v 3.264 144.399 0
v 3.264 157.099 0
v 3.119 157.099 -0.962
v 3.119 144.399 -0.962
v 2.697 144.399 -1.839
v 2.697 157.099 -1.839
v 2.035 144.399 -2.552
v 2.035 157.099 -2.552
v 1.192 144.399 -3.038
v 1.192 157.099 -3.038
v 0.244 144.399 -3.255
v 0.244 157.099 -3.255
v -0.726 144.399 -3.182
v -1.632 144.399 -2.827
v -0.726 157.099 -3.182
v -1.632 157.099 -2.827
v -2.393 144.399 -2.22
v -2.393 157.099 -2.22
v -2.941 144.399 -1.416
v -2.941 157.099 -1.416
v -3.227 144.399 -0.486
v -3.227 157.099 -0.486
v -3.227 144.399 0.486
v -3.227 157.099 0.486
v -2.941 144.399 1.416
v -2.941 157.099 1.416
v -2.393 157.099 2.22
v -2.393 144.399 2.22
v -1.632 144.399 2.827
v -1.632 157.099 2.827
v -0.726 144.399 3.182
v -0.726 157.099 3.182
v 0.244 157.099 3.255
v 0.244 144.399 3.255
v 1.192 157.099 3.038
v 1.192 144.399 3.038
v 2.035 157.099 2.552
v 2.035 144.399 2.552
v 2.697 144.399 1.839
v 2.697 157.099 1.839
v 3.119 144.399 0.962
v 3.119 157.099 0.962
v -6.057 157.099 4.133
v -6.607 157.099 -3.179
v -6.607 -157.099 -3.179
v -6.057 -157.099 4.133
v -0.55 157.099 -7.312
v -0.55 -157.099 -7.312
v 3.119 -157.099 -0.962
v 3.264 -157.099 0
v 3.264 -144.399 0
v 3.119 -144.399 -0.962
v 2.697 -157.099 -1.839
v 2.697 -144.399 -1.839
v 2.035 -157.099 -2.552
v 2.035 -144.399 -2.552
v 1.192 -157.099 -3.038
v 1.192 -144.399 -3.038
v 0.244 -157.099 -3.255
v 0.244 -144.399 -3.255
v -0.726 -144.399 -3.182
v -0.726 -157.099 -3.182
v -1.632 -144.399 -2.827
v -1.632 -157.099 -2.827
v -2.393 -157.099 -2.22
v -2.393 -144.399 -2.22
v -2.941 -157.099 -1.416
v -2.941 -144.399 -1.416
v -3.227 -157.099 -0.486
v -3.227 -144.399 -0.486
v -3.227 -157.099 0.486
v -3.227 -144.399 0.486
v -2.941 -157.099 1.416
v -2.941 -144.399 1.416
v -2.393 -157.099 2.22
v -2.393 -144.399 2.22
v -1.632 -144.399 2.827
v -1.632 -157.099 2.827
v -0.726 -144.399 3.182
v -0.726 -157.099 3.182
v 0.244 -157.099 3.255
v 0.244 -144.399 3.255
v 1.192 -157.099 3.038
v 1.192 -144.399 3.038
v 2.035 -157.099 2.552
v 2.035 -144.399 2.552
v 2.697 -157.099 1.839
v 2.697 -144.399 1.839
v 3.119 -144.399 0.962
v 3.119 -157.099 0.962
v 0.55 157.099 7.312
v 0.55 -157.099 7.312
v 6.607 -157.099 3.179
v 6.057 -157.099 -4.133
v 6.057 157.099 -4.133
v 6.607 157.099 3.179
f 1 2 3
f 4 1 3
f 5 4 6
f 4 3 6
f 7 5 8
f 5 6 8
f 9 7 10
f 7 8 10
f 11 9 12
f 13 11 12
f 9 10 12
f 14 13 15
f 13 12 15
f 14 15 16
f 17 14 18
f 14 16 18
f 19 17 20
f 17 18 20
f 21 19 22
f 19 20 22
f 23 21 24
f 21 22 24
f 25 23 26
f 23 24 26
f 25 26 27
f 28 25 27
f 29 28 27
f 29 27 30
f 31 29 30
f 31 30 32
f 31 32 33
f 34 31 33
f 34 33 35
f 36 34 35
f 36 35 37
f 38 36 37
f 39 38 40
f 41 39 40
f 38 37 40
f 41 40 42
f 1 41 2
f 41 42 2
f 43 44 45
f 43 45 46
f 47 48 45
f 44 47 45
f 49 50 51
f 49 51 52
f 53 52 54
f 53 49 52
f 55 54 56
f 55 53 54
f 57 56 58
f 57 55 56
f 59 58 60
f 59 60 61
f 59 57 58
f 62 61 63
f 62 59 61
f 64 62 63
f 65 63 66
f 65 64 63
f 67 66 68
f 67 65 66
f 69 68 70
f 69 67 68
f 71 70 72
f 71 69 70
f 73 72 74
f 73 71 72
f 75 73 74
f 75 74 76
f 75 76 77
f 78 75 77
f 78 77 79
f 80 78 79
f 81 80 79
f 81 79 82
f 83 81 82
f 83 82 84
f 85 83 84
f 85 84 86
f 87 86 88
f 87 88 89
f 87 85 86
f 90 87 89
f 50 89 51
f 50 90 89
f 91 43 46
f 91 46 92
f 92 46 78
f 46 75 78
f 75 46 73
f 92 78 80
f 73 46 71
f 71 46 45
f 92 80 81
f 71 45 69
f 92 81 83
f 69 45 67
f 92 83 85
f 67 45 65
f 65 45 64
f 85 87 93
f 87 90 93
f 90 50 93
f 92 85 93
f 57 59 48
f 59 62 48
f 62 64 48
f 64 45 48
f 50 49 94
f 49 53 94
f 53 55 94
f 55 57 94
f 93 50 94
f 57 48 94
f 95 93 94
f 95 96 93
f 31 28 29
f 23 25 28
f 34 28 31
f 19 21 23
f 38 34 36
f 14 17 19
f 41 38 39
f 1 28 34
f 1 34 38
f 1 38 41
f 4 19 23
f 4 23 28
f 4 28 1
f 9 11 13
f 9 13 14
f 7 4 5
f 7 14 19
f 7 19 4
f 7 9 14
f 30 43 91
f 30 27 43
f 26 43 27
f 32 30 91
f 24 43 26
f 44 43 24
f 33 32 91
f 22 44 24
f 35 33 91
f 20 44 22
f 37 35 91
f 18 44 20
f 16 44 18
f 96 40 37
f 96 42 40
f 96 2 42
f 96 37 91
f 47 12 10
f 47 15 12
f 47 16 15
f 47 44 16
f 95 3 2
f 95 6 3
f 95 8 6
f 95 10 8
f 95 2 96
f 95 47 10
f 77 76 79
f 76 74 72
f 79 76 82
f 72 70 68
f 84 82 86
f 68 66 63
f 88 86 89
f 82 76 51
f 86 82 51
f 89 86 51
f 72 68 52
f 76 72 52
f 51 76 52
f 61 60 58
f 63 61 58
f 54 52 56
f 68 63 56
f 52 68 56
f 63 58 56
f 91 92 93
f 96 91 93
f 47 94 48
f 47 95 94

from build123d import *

# Parameters (mm, degrees)
BOSS_EXTRUDE1_DEPTH = 157.099
SKETCH2_R           = 3.2639
CUT_EXTRUDE1_DEPTH  = 12.7


with BuildPart() as part:
    # Sketch1 → Boss-Extrude1 (new body, symmetric)
    with BuildSketch(Plane(origin=(0, 0, 0), x_dir=(1, 0, 0), z_dir=(0, 1, 0))):
        Polygon((6.05685162, 4.132539387), (-0.550458281, 7.311657064), (-6.607309901, 3.179117677), (-6.05685162, -4.132539387), (0.550458281, -7.311657064), (6.607309901, -3.179117677), align=None)
    extrude(amount=BOSS_EXTRUDE1_DEPTH, both=True)

    # Sketch2 → Cut-Extrude1 (cut)
    with BuildSketch(Plane(origin=(0, 157.099, 0), x_dir=(1, 0, 0), z_dir=(0, 1, 0))):
        Circle(SKETCH2_R)
    cut_extrude1 = extrude(amount=-CUT_EXTRUDE1_DEPTH, mode=Mode.SUBTRACT)

    # Mirror1: Cut-Extrude1 across plane
    add(cut_extrude1.mirror(Plane.ZX), mode=Mode.SUBTRACT)


solid = part.part
